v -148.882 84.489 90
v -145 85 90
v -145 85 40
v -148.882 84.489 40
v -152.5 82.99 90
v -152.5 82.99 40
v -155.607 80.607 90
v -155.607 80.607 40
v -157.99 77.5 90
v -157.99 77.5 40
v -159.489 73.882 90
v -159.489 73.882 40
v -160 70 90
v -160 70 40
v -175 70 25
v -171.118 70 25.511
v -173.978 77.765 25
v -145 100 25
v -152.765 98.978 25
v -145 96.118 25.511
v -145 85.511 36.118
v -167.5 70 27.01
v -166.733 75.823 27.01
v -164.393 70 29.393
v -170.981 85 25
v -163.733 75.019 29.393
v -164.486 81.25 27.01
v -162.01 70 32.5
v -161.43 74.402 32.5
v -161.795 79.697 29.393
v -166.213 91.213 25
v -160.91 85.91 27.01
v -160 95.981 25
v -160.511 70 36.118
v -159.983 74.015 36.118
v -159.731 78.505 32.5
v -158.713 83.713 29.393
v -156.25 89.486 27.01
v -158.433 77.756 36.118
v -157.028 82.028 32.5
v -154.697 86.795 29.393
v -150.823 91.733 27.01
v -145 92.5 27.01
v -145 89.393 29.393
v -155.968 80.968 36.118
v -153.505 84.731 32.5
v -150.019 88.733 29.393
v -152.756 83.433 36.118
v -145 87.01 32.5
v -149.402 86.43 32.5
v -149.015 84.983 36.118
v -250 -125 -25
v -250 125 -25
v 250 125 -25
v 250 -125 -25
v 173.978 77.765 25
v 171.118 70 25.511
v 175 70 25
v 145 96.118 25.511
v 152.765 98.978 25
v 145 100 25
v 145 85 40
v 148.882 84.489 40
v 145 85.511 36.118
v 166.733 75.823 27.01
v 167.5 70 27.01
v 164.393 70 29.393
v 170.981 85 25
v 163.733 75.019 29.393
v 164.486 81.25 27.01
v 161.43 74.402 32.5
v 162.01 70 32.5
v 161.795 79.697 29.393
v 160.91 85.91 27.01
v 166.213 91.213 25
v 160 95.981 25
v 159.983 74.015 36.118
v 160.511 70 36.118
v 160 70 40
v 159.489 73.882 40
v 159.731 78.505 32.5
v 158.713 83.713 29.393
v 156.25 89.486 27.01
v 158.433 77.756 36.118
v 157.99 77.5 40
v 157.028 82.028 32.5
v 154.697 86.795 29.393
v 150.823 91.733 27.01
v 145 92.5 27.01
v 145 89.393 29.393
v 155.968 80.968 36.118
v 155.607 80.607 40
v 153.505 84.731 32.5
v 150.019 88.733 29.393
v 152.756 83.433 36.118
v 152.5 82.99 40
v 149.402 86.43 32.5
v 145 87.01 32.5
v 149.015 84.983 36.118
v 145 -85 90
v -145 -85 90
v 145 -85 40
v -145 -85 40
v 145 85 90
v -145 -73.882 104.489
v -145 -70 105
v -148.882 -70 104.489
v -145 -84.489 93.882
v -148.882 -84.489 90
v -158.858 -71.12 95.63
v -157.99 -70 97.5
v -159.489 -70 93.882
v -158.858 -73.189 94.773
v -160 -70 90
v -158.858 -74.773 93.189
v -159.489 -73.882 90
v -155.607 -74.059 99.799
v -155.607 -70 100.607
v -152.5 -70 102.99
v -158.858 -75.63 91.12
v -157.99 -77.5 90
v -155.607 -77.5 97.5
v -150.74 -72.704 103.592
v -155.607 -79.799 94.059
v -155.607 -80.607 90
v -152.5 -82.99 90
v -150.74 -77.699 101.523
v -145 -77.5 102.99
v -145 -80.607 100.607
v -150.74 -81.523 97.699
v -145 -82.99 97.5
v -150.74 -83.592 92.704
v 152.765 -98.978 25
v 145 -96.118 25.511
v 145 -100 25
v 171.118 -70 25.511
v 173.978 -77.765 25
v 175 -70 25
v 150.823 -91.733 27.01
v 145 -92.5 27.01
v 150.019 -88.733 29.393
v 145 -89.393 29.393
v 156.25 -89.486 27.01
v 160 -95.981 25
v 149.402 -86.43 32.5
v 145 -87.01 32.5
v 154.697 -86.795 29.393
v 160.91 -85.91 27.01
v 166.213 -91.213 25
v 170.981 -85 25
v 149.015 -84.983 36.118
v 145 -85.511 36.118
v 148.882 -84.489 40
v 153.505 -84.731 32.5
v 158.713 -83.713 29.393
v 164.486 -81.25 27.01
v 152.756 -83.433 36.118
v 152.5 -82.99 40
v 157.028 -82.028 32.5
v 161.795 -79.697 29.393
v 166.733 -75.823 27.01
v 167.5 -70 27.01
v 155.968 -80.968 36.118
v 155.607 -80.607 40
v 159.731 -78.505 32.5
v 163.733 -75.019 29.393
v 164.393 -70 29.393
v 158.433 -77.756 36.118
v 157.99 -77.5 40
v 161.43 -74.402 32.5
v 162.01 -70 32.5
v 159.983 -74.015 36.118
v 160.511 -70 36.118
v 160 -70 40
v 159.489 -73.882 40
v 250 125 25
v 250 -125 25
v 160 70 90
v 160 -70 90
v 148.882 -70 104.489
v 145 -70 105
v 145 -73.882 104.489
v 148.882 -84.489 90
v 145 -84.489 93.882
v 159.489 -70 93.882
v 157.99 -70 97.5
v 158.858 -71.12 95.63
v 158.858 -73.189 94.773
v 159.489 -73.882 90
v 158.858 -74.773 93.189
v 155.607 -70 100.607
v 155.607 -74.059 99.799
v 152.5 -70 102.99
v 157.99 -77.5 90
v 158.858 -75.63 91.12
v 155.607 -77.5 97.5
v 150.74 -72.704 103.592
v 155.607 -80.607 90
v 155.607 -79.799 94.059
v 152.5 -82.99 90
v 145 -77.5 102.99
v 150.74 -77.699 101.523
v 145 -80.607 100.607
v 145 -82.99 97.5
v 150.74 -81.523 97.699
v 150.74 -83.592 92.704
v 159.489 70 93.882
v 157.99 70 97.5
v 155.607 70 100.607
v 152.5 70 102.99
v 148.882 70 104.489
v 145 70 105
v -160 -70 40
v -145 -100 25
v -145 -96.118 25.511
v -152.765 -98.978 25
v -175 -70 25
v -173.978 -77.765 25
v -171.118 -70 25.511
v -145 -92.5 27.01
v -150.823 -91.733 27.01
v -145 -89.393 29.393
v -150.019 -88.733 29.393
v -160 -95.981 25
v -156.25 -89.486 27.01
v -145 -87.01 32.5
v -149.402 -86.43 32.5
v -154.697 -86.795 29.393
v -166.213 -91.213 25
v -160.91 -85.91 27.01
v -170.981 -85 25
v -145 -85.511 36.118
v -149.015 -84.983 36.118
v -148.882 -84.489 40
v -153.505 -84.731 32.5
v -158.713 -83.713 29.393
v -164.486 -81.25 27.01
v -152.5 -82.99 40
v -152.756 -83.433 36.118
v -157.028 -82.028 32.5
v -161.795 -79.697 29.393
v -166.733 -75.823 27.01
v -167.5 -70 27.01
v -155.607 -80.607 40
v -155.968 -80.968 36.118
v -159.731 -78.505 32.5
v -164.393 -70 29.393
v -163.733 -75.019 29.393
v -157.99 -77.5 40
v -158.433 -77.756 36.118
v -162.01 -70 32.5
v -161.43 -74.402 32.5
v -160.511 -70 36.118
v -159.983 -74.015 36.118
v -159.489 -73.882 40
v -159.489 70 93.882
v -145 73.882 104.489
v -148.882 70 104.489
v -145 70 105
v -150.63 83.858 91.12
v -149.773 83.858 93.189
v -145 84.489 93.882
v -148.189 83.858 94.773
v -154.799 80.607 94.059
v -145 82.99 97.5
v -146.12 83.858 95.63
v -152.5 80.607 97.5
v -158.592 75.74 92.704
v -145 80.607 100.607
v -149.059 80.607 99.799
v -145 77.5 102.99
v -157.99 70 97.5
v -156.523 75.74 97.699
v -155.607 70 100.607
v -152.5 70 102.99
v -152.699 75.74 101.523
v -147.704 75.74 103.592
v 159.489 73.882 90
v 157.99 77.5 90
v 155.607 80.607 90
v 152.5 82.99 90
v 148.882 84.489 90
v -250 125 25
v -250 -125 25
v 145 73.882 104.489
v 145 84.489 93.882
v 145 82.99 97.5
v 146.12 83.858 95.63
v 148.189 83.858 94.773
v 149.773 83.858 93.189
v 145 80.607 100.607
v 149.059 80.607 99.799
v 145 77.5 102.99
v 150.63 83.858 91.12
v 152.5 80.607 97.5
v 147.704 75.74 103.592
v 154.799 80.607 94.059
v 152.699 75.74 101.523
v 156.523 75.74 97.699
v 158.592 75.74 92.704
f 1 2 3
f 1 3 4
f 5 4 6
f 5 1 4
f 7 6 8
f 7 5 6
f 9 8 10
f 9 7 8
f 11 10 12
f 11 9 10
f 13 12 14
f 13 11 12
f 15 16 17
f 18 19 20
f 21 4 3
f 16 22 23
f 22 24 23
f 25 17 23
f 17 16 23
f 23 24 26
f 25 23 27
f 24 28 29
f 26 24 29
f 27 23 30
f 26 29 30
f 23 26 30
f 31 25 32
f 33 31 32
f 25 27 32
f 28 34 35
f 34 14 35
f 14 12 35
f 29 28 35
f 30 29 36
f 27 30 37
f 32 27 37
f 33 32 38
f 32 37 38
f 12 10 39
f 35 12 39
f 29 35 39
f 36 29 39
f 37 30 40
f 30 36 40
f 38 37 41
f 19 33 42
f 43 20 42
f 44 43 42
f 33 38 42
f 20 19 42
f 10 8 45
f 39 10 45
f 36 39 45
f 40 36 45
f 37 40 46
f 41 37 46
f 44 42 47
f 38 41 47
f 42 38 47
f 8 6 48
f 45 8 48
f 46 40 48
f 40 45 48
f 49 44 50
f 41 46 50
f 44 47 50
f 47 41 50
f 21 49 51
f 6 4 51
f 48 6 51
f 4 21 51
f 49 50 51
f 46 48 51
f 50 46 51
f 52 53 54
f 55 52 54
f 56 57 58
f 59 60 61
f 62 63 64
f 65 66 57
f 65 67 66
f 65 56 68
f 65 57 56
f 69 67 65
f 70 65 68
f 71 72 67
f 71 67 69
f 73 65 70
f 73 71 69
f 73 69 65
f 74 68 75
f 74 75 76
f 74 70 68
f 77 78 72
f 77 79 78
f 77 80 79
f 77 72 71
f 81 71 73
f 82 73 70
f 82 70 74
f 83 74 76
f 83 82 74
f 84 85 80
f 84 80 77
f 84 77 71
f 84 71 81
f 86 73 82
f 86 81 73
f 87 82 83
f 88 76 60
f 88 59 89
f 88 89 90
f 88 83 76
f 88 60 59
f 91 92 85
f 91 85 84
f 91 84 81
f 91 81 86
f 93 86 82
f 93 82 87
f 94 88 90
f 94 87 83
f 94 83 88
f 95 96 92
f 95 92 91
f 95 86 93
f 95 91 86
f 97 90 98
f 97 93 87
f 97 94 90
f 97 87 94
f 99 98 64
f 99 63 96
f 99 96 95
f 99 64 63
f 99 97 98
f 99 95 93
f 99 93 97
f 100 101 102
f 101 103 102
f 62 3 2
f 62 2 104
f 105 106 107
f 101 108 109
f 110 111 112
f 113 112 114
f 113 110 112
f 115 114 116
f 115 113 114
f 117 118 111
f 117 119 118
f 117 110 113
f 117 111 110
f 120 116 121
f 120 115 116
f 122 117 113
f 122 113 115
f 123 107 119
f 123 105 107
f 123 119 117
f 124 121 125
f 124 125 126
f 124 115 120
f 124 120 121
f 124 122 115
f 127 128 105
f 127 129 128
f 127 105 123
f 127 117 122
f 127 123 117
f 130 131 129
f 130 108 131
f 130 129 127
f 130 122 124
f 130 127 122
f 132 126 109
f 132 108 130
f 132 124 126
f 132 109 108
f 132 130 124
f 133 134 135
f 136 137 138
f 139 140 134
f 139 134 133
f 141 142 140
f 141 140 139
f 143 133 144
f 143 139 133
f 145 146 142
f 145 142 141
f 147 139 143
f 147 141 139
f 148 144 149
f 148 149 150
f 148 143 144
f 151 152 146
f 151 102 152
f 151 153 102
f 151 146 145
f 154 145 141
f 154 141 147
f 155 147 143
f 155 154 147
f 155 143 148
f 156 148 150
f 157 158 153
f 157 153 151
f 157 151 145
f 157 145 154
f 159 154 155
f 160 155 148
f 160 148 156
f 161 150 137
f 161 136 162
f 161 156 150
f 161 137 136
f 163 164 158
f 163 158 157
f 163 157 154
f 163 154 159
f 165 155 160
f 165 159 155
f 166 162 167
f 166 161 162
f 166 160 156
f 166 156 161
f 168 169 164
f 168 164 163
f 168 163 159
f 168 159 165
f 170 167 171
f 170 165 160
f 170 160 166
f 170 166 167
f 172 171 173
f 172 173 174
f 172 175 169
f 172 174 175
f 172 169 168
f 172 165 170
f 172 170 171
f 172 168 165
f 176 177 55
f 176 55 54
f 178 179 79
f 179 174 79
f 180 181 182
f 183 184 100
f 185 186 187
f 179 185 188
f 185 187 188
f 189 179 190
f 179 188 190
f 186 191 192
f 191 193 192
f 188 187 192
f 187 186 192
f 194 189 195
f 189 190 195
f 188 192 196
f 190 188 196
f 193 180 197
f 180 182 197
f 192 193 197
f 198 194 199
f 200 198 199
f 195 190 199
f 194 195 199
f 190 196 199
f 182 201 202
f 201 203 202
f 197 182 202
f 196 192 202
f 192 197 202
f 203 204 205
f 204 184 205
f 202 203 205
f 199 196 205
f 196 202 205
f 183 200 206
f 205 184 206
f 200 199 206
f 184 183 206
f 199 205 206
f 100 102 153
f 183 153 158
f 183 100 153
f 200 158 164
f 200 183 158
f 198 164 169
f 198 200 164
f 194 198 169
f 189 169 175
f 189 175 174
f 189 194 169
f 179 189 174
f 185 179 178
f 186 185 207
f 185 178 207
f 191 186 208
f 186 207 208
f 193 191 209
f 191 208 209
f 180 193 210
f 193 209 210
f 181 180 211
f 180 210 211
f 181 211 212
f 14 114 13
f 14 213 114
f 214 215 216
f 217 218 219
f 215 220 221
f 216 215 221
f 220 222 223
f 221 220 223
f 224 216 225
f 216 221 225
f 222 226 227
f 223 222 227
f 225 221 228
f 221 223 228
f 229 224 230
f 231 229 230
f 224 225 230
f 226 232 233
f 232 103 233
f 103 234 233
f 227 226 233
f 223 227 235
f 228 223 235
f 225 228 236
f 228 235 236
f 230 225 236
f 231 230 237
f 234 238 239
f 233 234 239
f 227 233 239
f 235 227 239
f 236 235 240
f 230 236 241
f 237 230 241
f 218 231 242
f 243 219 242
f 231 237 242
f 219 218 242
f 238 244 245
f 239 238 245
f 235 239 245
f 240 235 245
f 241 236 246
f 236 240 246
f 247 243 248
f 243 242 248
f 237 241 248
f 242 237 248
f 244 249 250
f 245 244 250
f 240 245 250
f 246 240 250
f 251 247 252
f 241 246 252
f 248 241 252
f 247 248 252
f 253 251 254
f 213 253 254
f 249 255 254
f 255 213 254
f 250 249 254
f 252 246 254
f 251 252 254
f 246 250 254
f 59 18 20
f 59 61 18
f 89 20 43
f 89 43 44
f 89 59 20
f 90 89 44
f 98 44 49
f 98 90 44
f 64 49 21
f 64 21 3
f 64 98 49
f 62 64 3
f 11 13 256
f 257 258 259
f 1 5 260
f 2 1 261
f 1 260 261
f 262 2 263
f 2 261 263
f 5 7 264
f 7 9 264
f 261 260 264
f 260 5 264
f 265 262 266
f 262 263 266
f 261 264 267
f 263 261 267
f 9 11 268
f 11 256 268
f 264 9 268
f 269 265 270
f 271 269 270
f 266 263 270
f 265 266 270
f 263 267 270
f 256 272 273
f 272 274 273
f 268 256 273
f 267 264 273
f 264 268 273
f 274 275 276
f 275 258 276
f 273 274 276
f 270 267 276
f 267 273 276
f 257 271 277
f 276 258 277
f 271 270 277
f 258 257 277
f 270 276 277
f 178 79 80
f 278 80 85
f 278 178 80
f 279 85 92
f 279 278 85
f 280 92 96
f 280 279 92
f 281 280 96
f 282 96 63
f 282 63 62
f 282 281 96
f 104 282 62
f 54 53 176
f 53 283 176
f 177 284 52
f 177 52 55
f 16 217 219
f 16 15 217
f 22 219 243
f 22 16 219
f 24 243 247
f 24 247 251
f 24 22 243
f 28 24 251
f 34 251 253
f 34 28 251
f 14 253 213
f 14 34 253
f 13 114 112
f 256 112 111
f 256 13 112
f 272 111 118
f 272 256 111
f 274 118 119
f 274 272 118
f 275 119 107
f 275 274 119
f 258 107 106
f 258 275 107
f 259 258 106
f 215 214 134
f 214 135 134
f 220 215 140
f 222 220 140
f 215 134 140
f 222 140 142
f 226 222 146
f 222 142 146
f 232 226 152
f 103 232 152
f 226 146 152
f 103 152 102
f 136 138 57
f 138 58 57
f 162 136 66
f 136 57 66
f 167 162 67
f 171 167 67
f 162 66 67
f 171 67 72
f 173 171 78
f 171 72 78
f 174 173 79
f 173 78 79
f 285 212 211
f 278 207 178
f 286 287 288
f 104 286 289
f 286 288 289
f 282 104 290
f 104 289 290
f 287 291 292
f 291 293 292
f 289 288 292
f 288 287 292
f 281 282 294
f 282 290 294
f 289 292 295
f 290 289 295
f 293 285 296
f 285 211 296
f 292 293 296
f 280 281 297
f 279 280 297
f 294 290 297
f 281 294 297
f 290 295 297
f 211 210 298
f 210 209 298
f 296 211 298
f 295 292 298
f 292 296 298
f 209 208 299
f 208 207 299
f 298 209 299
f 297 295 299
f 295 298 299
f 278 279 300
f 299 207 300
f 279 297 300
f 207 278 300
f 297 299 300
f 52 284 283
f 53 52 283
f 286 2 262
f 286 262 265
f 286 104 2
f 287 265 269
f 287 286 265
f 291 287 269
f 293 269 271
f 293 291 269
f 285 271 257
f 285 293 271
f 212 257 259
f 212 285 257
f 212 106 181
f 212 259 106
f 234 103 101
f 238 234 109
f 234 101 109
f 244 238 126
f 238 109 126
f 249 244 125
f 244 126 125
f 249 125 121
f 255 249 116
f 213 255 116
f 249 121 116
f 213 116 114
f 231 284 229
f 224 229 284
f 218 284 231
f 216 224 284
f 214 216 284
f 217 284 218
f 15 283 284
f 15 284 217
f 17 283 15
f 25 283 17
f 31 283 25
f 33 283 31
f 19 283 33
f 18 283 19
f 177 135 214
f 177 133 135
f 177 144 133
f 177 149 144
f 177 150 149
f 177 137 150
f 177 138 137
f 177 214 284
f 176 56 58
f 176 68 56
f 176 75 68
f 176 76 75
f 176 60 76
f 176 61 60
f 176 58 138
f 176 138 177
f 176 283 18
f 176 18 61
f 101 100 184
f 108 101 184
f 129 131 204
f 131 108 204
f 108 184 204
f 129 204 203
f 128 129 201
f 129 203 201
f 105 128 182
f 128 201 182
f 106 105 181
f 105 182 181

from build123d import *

# Parameters (mm, degrees)
F0_W     = 500
F0_H     = 250
F1_DEPTH = 25
F2_W     = 320
F2_H     = 170
F3_DEPTH = 80
F4_R     = 15


with BuildPart() as f1:
    # F0 (on Top) → F1 (new body, symmetric)
    with BuildSketch(Plane.XY):
        Rectangle(F0_W, F0_H)
    extrude(amount=F1_DEPTH, both=True)

    # F2 (on face) → F3 (join)
    with BuildSketch(Plane.XY.offset(25)):
        Rectangle(F2_W, F2_H)
    extrude(amount=F3_DEPTH)

    # F4
    f4_edges = [f1.edges().sort_by_distance(p)[0] for p in [
        (0, -85, 105),
        (-160, 0, 105),
        (160, 0, 105),
        (-160, -85, 65),
        (-160, 85, 65),
        (160, -85, 65),
        (0, 85, 105),
        (160, 85, 65),
        (0, -85, 25),
        (-160, 0, 25),
        (160, 0, 25),
        (0, 85, 25),
    ]]
    fillet(f4_edges, radius=F4_R)


solid = f1.part
